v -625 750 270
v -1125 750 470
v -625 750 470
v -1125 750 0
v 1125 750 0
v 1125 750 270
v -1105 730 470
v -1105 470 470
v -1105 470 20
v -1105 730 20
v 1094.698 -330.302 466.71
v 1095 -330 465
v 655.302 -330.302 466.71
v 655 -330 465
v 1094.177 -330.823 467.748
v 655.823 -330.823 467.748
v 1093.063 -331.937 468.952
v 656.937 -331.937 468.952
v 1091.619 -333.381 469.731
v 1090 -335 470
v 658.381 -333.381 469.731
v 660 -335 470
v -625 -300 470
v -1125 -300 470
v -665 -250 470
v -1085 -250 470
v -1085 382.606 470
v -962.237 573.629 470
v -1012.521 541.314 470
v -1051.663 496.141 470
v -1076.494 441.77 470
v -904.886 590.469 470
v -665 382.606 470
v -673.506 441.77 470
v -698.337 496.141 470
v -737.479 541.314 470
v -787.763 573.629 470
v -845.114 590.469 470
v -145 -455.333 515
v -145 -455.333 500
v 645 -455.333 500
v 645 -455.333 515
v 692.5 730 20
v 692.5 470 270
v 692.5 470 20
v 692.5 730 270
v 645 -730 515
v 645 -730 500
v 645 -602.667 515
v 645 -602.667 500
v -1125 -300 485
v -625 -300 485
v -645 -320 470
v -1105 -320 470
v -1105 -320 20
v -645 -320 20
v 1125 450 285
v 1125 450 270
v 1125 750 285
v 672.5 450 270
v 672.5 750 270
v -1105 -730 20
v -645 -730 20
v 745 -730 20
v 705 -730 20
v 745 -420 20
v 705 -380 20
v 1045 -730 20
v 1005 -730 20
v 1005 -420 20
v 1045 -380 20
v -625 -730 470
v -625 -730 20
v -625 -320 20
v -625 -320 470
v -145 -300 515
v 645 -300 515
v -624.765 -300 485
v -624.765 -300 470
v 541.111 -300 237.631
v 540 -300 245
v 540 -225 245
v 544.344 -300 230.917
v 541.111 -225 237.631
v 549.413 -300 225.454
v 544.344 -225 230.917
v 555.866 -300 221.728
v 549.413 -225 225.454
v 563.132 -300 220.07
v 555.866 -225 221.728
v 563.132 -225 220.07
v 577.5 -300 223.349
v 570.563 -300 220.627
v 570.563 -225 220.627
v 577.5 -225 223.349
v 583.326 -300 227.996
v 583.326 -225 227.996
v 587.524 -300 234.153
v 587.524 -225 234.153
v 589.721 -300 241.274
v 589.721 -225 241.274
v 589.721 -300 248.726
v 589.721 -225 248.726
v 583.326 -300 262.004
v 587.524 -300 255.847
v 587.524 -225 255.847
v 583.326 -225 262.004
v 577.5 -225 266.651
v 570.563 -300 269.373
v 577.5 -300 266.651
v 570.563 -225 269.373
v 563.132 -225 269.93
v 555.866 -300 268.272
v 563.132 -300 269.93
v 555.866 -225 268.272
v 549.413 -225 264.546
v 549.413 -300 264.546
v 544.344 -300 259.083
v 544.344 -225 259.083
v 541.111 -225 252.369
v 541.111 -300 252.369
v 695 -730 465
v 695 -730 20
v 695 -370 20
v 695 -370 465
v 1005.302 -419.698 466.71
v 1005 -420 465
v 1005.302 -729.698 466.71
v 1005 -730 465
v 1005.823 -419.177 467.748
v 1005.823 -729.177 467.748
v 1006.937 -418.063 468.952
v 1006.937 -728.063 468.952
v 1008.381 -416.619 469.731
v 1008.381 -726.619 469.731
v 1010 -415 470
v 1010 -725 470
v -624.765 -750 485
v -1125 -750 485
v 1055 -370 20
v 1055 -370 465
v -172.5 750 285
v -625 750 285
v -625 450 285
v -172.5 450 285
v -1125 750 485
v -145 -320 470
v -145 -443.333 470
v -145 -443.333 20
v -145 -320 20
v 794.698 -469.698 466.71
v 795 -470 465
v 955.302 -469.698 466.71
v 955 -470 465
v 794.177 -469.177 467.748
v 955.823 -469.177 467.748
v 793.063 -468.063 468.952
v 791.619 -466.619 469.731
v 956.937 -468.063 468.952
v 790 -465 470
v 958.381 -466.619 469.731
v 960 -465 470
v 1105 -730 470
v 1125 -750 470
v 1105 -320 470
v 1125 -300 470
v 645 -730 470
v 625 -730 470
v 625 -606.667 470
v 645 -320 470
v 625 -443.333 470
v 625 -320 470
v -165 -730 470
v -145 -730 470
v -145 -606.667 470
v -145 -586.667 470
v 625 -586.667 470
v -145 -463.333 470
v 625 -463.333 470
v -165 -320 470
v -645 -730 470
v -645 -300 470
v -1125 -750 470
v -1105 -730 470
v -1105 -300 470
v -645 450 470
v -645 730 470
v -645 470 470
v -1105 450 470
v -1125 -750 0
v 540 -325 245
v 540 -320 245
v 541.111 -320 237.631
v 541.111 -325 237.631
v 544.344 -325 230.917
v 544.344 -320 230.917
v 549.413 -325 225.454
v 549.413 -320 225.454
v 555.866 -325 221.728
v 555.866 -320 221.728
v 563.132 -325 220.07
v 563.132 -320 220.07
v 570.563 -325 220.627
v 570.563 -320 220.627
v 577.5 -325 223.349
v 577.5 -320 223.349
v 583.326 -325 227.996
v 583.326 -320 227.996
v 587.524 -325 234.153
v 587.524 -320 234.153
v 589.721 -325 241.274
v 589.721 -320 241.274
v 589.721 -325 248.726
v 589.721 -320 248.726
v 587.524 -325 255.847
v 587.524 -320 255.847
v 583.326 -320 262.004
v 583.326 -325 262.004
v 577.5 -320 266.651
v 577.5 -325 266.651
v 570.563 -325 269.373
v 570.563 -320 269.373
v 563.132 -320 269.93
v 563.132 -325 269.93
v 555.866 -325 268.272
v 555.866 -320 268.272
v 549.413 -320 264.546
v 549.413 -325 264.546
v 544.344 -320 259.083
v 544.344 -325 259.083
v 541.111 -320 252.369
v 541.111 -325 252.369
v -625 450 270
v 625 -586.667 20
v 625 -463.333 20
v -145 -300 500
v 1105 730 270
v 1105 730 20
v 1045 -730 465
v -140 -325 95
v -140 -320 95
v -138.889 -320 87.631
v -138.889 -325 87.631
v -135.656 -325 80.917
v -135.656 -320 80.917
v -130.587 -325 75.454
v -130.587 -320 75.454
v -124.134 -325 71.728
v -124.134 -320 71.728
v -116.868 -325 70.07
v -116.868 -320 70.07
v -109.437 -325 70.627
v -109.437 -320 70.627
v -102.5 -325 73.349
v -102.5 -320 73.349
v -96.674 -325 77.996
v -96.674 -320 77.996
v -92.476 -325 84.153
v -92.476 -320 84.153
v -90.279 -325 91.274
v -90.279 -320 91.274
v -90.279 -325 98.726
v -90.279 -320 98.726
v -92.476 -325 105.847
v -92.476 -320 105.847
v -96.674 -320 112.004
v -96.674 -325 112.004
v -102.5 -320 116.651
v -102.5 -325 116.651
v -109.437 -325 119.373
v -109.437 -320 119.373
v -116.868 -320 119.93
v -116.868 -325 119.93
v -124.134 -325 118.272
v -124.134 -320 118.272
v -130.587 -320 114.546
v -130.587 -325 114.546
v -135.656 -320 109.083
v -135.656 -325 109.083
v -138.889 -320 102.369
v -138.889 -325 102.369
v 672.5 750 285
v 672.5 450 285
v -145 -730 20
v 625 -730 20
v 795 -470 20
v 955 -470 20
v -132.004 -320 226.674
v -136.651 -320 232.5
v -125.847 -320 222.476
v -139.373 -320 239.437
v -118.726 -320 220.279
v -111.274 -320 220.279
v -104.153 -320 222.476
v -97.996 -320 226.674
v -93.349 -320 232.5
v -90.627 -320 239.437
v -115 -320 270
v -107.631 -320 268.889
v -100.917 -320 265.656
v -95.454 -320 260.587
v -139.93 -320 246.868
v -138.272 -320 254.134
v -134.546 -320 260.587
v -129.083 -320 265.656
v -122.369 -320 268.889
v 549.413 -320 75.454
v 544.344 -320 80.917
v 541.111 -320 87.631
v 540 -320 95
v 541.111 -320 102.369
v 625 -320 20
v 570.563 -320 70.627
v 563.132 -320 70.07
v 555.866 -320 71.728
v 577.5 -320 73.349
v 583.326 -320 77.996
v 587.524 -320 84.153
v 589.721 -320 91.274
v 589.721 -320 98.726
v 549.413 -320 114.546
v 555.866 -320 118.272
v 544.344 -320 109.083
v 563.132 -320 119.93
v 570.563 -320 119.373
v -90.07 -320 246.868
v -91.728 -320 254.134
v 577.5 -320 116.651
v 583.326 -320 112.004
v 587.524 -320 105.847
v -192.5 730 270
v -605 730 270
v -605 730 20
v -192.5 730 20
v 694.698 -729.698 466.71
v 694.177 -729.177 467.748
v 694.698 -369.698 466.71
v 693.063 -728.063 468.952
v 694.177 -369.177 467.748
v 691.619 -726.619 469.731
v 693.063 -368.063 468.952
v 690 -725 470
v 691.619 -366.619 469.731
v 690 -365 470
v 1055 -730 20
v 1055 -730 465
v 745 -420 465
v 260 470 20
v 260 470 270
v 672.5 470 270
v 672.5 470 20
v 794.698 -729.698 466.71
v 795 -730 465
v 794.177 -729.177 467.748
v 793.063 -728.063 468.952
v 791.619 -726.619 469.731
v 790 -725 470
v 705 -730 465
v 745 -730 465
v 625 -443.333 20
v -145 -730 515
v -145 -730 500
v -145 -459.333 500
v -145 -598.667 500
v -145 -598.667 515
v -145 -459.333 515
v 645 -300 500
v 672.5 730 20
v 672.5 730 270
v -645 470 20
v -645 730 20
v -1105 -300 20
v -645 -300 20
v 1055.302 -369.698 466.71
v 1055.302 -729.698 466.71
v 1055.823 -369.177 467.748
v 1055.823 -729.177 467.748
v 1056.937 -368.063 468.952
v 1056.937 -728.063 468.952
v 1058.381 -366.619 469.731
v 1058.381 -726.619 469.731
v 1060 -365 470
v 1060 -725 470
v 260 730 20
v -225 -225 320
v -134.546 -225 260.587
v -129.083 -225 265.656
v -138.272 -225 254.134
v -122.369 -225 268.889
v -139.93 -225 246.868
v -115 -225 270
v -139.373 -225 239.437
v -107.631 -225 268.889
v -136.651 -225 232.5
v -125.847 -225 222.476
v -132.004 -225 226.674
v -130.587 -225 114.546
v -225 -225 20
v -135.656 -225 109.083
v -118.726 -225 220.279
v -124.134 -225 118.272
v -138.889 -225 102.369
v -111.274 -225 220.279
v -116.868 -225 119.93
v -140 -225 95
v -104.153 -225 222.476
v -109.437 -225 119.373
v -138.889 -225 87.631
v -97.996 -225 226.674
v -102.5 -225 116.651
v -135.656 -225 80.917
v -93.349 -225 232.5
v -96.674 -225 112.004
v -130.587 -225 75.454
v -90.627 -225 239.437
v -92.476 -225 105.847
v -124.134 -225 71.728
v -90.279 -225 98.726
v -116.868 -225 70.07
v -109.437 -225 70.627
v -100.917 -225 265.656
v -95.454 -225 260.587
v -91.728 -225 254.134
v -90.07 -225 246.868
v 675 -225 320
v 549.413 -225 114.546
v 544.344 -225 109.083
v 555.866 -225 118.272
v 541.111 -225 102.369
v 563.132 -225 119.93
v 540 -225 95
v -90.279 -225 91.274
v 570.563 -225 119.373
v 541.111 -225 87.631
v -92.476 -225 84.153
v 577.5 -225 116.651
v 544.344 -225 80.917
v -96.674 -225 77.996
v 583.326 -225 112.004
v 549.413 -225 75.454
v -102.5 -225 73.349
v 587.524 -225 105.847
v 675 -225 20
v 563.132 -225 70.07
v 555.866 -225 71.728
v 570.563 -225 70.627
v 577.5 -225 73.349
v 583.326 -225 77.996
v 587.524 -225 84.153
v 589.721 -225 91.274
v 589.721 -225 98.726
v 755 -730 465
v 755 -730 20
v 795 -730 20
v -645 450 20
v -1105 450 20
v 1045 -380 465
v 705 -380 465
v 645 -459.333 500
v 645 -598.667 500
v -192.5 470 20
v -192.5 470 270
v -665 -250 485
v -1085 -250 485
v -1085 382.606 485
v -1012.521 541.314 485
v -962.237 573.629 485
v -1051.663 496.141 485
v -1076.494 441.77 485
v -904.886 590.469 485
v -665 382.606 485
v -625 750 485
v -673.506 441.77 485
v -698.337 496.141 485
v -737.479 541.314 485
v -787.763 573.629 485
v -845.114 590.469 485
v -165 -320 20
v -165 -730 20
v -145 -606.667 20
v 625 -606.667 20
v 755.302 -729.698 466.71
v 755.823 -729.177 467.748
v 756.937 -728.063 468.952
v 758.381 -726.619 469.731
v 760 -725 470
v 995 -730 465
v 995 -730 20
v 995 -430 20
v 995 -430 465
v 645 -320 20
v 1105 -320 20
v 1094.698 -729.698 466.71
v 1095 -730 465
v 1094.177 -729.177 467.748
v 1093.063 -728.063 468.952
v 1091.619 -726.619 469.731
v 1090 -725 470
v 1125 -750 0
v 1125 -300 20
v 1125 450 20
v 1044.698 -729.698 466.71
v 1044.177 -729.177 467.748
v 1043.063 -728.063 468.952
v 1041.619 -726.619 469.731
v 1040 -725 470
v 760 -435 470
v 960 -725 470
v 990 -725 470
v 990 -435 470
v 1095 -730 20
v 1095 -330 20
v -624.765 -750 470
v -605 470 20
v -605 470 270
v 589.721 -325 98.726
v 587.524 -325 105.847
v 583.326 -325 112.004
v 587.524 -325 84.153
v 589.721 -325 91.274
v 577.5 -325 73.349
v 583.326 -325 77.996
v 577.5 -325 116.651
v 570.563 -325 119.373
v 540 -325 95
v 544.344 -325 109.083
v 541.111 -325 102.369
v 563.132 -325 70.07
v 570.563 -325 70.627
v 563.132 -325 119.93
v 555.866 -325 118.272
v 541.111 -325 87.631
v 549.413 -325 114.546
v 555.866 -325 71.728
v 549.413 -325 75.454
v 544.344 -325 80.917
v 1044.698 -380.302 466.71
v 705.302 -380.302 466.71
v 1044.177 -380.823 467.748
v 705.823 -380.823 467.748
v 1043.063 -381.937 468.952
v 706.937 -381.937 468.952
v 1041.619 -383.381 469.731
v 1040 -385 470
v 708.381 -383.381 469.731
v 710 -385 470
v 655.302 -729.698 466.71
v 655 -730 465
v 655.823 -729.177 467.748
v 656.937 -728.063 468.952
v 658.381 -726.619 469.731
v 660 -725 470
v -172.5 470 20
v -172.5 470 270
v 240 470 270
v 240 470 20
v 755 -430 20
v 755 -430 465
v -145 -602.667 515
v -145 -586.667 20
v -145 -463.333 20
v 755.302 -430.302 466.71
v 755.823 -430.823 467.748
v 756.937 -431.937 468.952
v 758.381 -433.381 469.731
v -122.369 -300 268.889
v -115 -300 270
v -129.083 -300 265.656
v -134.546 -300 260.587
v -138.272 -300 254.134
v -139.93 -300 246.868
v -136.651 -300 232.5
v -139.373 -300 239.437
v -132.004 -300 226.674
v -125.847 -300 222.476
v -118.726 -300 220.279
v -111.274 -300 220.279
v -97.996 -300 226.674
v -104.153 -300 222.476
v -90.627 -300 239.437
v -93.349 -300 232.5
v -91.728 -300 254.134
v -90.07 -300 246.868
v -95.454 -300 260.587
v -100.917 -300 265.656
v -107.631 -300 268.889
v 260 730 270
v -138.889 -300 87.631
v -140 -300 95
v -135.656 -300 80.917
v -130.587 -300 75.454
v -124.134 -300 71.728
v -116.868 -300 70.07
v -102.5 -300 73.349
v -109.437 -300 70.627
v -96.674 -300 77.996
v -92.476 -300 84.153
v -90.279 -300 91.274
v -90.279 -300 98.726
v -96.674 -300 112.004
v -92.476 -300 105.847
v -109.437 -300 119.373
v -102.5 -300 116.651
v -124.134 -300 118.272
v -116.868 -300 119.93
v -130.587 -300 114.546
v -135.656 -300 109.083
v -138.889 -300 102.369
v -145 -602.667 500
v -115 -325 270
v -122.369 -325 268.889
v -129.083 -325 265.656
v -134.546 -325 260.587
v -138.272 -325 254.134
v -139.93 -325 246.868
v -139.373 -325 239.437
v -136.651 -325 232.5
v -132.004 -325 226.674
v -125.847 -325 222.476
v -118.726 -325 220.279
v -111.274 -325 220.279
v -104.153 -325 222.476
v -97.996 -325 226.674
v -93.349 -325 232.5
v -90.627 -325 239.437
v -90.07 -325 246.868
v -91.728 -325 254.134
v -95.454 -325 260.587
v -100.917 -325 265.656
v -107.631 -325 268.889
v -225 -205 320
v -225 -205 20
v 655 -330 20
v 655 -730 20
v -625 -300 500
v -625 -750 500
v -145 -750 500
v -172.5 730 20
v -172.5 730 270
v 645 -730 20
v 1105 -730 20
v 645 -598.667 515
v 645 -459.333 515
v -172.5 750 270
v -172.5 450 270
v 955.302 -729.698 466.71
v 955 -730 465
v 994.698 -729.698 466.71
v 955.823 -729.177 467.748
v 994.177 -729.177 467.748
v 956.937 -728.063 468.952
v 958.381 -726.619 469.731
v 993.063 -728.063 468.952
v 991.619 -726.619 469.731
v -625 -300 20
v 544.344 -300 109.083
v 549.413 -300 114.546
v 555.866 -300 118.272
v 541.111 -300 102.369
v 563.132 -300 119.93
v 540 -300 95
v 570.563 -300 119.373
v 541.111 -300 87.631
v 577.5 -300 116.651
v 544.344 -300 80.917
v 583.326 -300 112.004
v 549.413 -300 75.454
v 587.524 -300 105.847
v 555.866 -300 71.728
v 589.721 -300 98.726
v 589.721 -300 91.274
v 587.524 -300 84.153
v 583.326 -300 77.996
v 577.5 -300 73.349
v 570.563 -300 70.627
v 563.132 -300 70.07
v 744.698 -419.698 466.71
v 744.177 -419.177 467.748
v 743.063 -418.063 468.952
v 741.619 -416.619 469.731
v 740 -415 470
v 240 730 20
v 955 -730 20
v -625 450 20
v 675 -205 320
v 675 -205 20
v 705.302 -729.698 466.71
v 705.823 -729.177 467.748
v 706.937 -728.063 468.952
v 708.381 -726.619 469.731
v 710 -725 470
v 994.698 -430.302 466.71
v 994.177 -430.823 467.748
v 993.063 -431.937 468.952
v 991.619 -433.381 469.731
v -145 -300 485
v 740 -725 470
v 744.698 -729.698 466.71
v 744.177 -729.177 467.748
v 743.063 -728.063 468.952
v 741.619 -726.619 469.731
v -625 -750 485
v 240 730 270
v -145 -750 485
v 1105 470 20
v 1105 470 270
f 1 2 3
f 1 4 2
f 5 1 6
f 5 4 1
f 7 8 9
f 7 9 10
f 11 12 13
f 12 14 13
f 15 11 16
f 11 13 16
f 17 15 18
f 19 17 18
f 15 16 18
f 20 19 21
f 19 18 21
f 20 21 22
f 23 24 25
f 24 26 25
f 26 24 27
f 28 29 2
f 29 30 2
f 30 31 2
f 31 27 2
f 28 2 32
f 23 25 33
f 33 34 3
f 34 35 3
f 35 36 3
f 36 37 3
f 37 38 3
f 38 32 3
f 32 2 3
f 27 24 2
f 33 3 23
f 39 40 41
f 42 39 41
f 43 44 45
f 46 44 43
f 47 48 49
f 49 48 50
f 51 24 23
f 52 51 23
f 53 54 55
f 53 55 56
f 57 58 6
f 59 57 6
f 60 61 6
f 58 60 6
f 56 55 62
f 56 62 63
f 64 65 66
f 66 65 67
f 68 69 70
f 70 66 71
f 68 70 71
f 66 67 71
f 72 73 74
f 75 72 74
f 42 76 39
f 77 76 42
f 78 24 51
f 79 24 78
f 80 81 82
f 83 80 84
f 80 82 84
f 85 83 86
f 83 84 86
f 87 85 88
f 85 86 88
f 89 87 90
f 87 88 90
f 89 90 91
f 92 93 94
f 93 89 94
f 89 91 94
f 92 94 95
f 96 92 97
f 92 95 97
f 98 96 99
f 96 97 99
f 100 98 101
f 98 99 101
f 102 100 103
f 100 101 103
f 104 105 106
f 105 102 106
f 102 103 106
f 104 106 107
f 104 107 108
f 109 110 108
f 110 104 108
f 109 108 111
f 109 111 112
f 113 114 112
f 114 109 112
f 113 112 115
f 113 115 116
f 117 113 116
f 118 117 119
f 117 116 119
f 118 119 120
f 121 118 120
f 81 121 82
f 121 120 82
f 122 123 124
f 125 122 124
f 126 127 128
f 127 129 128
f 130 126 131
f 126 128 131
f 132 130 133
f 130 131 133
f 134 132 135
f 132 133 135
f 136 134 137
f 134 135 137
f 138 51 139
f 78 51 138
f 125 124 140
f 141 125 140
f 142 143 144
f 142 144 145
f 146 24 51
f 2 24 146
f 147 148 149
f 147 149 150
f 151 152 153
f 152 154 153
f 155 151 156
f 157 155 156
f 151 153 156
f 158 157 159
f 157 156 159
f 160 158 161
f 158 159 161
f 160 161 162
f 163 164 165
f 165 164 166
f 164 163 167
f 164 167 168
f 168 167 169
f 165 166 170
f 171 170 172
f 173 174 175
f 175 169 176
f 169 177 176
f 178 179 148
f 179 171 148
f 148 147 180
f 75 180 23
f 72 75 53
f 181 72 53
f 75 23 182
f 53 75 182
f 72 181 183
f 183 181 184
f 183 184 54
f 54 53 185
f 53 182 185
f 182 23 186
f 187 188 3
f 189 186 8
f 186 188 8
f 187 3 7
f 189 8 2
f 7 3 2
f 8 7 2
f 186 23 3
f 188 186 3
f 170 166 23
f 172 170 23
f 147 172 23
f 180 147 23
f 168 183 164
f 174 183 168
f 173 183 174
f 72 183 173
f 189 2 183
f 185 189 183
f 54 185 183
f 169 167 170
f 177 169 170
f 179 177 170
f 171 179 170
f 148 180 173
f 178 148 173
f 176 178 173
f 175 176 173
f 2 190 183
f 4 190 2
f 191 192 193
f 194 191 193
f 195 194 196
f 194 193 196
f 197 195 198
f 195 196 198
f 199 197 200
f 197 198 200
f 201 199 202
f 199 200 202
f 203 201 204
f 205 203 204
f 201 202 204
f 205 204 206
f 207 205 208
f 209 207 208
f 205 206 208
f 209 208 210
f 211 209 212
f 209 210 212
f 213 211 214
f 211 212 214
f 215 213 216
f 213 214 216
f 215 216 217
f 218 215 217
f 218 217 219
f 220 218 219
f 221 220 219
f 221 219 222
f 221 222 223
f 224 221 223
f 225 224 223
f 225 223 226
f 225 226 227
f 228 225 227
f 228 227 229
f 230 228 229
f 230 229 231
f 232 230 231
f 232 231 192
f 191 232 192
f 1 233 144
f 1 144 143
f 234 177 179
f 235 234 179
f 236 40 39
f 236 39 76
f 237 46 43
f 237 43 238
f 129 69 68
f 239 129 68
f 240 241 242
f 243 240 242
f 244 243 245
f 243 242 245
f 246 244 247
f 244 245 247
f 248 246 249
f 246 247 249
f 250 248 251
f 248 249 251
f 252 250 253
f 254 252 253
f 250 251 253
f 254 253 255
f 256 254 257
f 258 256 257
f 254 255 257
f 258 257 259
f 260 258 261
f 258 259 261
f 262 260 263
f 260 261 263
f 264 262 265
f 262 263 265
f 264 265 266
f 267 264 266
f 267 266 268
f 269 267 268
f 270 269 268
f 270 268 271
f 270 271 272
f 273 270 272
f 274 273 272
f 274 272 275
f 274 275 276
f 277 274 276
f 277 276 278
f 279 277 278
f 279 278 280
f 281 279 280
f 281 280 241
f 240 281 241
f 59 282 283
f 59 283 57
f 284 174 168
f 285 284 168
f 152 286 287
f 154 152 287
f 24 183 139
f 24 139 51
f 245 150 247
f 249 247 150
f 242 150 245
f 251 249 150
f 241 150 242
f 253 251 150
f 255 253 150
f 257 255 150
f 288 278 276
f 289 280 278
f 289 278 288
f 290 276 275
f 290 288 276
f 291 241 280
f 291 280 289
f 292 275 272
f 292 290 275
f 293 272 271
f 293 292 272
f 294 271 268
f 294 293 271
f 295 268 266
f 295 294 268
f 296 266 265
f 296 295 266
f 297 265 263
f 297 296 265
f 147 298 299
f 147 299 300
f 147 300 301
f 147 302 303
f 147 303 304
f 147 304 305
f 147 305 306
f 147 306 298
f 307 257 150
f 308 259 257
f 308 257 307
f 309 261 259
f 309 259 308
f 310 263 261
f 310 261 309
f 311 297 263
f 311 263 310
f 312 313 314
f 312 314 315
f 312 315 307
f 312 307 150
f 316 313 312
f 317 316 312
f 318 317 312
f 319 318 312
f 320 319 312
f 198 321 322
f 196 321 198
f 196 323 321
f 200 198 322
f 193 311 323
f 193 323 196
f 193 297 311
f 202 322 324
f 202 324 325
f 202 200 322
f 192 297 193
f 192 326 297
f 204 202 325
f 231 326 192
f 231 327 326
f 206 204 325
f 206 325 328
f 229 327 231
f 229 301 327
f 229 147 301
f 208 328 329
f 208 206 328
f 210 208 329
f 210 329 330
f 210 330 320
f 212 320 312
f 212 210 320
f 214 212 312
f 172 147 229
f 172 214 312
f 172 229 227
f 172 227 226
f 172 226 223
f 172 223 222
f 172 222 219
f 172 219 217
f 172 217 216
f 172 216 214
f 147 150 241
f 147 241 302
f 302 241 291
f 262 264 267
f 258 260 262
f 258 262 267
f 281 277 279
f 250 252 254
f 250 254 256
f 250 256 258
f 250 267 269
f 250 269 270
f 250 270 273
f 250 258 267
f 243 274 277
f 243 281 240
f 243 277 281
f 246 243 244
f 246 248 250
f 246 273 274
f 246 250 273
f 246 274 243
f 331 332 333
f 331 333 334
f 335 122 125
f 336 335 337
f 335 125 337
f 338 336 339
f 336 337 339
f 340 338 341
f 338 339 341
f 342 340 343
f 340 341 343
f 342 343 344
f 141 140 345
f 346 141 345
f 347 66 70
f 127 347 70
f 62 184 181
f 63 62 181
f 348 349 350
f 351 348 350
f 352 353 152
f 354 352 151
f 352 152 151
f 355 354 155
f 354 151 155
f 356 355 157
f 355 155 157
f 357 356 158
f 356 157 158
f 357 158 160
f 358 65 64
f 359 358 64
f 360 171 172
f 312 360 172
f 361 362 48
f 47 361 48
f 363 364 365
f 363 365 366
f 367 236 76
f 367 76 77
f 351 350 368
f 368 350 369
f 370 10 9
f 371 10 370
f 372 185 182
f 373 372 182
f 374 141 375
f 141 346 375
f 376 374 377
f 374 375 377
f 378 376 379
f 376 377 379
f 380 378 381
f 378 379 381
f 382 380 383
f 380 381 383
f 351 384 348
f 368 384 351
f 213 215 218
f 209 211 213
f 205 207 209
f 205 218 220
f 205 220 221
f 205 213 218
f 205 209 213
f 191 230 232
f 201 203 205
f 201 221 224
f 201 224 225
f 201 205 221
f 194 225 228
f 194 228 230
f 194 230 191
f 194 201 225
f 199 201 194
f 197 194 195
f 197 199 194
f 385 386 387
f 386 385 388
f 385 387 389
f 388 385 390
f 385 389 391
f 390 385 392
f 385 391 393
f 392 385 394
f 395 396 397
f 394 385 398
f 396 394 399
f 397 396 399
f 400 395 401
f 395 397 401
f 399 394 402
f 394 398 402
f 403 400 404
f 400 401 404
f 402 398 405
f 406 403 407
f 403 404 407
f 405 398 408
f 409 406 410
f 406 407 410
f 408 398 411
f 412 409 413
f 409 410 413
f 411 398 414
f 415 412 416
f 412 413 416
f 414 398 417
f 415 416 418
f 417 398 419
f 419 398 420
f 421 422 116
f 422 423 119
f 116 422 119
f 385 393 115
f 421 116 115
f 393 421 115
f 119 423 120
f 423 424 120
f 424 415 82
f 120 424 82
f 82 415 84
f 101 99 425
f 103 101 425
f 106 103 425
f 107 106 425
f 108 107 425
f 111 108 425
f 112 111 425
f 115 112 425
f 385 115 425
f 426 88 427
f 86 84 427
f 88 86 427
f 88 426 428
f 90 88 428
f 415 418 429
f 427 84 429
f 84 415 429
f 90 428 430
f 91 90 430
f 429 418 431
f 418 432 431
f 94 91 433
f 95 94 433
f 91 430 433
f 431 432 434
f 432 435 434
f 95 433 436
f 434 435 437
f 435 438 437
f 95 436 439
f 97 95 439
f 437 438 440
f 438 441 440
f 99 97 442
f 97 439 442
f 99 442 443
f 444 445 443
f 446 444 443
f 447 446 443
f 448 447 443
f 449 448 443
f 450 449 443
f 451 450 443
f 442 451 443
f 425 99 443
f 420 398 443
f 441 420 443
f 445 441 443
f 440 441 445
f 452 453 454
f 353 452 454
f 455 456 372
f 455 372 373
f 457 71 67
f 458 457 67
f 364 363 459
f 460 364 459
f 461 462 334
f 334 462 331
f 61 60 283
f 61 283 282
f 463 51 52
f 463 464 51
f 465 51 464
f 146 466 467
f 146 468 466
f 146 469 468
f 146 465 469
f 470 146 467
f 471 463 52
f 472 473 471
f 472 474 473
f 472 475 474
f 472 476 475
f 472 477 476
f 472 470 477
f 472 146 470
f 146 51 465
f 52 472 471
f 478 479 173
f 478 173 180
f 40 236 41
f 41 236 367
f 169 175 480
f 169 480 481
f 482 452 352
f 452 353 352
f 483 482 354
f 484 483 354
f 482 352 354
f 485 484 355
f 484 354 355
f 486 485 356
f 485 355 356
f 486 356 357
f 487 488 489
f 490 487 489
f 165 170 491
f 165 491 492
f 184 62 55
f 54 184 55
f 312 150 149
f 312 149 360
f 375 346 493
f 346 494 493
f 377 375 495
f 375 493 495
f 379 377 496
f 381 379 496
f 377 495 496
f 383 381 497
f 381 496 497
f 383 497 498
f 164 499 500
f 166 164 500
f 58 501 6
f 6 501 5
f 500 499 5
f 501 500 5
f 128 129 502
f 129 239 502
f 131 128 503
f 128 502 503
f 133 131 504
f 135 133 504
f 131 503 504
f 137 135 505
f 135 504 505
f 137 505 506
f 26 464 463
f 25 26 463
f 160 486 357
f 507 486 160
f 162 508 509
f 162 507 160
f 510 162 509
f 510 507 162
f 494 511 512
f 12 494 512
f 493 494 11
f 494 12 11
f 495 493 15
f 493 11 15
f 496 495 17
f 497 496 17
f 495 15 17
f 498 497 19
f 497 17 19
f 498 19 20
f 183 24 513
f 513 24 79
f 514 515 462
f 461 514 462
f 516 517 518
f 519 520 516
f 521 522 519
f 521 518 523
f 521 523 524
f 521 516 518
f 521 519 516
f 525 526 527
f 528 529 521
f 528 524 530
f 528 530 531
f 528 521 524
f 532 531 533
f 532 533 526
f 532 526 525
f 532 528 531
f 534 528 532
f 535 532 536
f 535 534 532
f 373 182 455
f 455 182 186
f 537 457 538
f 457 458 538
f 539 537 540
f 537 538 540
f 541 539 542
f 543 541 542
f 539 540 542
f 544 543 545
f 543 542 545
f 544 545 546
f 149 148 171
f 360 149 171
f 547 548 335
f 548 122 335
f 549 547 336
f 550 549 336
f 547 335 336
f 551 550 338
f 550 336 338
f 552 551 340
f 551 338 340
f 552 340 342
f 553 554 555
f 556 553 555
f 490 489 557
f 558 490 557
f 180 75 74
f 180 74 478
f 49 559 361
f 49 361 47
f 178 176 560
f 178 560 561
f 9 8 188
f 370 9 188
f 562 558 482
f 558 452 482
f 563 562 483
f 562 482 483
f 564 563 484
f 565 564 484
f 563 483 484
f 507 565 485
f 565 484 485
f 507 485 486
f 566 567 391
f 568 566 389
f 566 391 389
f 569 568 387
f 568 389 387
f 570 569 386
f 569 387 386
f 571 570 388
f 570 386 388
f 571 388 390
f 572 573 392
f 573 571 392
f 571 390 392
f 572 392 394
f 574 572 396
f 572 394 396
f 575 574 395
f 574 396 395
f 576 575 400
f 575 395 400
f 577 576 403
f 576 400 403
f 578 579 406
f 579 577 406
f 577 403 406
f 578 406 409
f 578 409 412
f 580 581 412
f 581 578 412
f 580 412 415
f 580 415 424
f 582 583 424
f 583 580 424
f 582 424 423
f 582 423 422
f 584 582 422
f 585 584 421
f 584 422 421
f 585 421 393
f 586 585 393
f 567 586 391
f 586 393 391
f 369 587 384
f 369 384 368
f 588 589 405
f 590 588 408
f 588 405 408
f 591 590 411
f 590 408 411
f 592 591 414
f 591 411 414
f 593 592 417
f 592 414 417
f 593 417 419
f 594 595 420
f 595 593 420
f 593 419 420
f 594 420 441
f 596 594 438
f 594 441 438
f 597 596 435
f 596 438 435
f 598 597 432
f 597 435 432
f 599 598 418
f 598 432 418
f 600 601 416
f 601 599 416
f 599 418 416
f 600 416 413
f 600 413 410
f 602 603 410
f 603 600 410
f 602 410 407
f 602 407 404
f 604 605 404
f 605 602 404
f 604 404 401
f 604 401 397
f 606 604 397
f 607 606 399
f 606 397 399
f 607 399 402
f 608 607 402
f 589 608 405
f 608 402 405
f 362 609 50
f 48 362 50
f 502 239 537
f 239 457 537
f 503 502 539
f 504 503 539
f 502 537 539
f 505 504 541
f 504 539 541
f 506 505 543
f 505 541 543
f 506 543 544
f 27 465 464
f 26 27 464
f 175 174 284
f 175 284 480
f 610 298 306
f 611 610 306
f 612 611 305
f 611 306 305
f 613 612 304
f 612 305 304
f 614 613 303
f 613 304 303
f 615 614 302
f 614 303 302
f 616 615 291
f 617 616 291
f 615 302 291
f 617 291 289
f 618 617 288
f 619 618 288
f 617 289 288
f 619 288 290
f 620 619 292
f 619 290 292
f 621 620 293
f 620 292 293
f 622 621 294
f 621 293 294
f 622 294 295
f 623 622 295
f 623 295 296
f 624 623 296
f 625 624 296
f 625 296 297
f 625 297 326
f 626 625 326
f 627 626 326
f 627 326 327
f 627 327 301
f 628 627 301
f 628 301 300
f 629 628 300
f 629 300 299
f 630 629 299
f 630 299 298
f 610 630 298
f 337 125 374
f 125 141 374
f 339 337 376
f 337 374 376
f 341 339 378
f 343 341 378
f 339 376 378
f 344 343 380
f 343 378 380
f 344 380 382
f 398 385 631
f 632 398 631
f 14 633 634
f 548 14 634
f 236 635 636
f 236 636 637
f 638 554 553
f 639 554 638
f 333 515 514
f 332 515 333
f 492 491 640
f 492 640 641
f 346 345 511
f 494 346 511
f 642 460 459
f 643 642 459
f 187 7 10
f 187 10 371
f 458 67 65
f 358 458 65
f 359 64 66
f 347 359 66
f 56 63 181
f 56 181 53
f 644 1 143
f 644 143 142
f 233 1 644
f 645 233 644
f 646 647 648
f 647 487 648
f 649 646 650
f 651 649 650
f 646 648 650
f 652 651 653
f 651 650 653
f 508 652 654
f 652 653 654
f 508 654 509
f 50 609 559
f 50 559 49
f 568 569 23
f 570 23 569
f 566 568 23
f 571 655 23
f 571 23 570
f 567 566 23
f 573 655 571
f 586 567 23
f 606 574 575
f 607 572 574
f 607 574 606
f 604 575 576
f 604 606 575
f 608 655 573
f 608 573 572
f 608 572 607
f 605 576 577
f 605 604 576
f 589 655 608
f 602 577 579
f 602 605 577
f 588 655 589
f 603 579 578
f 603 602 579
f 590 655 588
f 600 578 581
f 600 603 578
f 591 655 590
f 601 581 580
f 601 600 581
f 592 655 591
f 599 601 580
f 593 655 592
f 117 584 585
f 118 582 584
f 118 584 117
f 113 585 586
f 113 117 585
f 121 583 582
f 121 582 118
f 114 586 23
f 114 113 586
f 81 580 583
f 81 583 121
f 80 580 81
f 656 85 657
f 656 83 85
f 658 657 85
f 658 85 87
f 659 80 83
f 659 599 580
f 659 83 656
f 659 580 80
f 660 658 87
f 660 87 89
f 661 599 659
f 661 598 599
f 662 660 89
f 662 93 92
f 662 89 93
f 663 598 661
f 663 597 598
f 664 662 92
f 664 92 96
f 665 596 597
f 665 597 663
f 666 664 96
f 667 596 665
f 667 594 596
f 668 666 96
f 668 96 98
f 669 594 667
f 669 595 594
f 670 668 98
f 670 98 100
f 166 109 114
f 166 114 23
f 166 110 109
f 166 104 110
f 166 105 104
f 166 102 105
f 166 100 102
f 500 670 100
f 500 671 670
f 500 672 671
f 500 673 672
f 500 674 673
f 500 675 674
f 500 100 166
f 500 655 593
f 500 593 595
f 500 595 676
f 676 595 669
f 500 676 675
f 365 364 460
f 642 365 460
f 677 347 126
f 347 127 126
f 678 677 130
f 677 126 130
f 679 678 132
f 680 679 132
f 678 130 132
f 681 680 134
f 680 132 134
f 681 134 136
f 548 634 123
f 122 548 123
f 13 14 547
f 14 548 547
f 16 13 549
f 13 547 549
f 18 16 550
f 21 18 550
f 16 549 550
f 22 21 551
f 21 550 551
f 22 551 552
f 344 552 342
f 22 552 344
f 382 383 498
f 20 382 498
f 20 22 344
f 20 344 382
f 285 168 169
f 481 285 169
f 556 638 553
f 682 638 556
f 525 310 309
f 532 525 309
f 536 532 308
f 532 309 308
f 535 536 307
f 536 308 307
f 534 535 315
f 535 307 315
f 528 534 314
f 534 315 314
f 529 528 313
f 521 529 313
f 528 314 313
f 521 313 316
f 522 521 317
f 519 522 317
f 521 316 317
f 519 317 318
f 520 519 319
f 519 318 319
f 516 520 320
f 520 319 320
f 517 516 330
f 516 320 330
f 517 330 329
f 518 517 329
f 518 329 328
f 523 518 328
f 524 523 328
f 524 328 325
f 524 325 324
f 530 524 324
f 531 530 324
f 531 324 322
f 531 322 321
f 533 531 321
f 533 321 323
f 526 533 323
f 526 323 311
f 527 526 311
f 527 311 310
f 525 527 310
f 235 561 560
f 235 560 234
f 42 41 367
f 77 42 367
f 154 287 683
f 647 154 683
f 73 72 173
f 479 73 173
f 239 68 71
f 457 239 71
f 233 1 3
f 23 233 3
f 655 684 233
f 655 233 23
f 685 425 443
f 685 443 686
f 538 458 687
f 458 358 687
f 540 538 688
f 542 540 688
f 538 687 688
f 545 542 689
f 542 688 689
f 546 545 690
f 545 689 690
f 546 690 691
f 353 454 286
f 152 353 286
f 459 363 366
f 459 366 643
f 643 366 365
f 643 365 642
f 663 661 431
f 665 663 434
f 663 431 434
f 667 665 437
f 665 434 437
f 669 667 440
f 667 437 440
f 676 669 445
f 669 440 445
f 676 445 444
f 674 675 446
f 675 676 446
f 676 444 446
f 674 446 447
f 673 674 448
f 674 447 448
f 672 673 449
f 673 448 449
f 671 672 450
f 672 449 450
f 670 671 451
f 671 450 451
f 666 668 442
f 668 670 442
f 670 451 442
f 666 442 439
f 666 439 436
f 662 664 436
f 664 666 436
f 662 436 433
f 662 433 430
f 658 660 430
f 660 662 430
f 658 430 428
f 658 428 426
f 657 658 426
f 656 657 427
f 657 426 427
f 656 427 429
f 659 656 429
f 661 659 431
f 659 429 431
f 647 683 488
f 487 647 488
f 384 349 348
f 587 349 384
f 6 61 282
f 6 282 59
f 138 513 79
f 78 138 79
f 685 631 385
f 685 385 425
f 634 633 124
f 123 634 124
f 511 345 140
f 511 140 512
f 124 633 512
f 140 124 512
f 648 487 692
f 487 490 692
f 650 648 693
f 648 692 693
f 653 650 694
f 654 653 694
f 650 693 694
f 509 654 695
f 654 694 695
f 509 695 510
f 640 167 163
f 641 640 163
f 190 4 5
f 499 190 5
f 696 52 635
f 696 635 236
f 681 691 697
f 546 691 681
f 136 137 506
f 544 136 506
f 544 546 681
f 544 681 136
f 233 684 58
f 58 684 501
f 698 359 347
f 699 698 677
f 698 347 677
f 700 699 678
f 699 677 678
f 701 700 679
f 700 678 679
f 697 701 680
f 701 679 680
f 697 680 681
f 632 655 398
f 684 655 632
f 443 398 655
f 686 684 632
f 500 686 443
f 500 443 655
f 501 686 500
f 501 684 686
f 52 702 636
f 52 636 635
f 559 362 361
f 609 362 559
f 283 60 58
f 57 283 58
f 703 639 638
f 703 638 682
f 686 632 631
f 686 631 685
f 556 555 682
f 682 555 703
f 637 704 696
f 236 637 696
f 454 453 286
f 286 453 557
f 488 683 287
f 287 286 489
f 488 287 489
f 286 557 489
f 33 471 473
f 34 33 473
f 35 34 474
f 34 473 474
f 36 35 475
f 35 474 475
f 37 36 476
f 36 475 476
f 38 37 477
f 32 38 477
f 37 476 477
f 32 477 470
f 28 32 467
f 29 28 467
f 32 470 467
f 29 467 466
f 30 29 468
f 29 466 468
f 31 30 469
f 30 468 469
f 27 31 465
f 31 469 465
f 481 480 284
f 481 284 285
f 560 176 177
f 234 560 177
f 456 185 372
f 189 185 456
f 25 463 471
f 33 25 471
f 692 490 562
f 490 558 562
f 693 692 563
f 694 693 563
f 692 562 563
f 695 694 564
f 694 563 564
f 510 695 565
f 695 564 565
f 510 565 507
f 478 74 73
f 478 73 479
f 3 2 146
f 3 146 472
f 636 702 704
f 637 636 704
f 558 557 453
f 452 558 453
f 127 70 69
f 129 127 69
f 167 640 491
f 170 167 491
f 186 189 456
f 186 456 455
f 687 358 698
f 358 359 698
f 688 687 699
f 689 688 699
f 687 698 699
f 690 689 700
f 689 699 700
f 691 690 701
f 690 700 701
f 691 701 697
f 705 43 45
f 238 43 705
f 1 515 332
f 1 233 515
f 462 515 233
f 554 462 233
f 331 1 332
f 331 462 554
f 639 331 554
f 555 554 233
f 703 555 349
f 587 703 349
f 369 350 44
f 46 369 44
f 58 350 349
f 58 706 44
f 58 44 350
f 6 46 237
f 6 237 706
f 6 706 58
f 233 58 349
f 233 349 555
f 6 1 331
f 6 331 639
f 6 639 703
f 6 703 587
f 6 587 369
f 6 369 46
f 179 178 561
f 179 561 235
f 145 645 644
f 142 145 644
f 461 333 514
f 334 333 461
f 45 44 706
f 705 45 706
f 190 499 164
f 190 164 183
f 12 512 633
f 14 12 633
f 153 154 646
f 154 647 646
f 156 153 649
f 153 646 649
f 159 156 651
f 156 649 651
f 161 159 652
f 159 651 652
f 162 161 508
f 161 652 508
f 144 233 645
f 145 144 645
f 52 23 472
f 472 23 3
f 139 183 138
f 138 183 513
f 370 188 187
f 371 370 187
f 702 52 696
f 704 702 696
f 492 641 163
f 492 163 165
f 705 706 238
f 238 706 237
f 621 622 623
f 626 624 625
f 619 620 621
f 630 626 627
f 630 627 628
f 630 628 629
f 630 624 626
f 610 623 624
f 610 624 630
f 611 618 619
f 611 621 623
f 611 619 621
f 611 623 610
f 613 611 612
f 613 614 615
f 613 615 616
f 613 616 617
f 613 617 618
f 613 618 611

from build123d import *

# Parameters (mm, degrees)
SKETCH1_W              = 2250
SKETCH1_H              = 1500
BOSS_EXTRUDE1_DEPTH    = 20
BOSS_EXTRUDE2_DEPTH    = 450
SKETCH4_W              = 1750
SKETCH4_H              = 300
BOSS_EXTRUDE3_DEPTH    = 250
SKETCH5_W              = 412.5
SKETCH5_H              = 260
CUT_EXTRUDE1_DEPTH     = 250
SKETCH6_W              = 460
SKETCH6_H              = 260
SKETCH6_H_2            = 750
SKETCH6_H_3            = 410
SKETCH6_W_2            = 770
SKETCH6_H_4            = 123.333333333
SKETCH6_H_5            = 123.333333334
CUT_EXTRUDE2_DEPTH     = 450
SKETCH7_W              = 900
SKETCH7_H              = 20
BOSS_EXTRUDE6_DEPTH    = 300
SKETCH10_R             = 25
BOSS_EXTRUDE7_DEPTH    = 100
BOSS_EXTRUDE8_DEPTH    = 450
BOSS_EXTRUDE8_2_DEPTH  = 450
BOSS_EXTRUDE8_3_DEPTH  = 450
FILLET1_R              = 5
FILLET2_R              = 5
FILLET3_R              = 5
SKETCH13_W             = 452.5
SKETCH13_H             = 300
BOSS_EXTRUDE9_DEPTH    = 15
BOSS_EXTRUDE9_2_DEPTH  = 15
SKETCH14_W             = 500
SKETCH14_H             = 1050
BOSS_EXTRUDE10_DEPTH   = 15
SKETCH15_W             = 500.235374178
SKETCH15_H             = 450
BOSS_EXTRUDE11_DEPTH   = 15
SKETCH16_W             = 480
SKETCH16_H             = 450
BOSS_EXTRUDE12_DEPTH   = 15
SKETCH17_W             = 790
SKETCH17_H             = 155.333333333
BOSS_EXTRUDE13_DEPTH   = 15
SKETCH17_H_2           = 139.333333334
BOSS_EXTRUDE13_2_DEPTH = 15
SKETCH17_H_3           = 127.333333333
BOSS_EXTRUDE13_3_DEPTH = 15
CUT_EXTRUDE3_DEPTH     = 15


with BuildPart() as part:
    # Sketch1 → Boss-Extrude1 (new body)
    with BuildSketch(Plane.XY):
        Rectangle(SKETCH1_W, SKETCH1_H)
    extrude(amount=BOSS_EXTRUDE1_DEPTH)

    # Sketch2 → Boss-Extrude2 (add)
    with BuildSketch(Plane.XY.offset(20)):
        Polygon((-625, 750), (-625, -300), (1125, -300), (1125, -750), (-1125, -750), (-1125, 750), align=None)
    extrude(amount=BOSS_EXTRUDE2_DEPTH)

    # Sketch4 → Boss-Extrude3 (add)
    with BuildSketch(Plane.XY.offset(20)):
        with Locations((250, 600)):
            Rectangle(SKETCH4_W, SKETCH4_H)
    extrude(amount=BOSS_EXTRUDE3_DEPTH)

    # Sketch5 → Cut-Extrude1 (cut)
    with BuildSketch(Plane.XY.offset(270)):
        with Locations((-398.75, 600)):
            Rectangle(SKETCH5_W, SKETCH5_H)
        with Locations((33.75, 600)):
            Rectangle(SKETCH5_W, SKETCH5_H)
        with Locations((466.25, 600)):
            Rectangle(SKETCH5_W, SKETCH5_H)
        with Locations((898.75, 600)):
            Rectangle(SKETCH5_W, SKETCH5_H)
    extrude(amount=-CUT_EXTRUDE1_DEPTH, mode=Mode.SUBTRACT)

    # Sketch6 → Cut-Extrude2 (cut)
    with BuildSketch(Plane.XY.offset(470)):
        with Locations((-875, 600)):
            Rectangle(SKETCH6_W, SKETCH6_H)
        with Locations((-875, 75)):
            Rectangle(SKETCH6_W, SKETCH6_H_2)
        with Locations((-875, -525)):
            Rectangle(SKETCH6_W, SKETCH6_H_3)
        with Locations((-395, -525)):
            Rectangle(SKETCH6_W, SKETCH6_H_3)
        with Locations((875, -525)):
            Rectangle(SKETCH6_W, SKETCH6_H_3)
        with Locations((240, -381.666666667)):
            Rectangle(SKETCH6_W_2, SKETCH6_H_4)
        with Locations((240, -525)):
            Rectangle(SKETCH6_W_2, SKETCH6_H_5)
        with Locations((240, -668.333333334)):
            Rectangle(SKETCH6_W_2, SKETCH6_H_4)
    extrude(amount=-CUT_EXTRUDE2_DEPTH, mode=Mode.SUBTRACT)



with BuildPart() as body_2:
    # Sketch7 → Boss-Extrude6 (new body)
    with BuildSketch(Plane.XY.offset(20)):
        with Locations((225, -215)):
            Rectangle(SKETCH7_W, SKETCH7_H)
    extrude(amount=BOSS_EXTRUDE6_DEPTH)


with BuildPart() as part_1:
    add(part.part)

    add(body_2.part)  # Boss-Extrude7 merges body 2
    # Sketch10 → Boss-Extrude7 (add)
    with BuildSketch(Plane.XZ.offset(225)):
        with Locations(Location((-115, 245, 0), (0, 0, 90))):
            Circle(SKETCH10_R)
        with Locations(Location((-115, 95, 0), (0, 0, 180))):
            Circle(SKETCH10_R)
        with Locations(Location((565, 245, 0), (0, 0, 180))):
            Circle(SKETCH10_R)
        with Locations(Location((565, 95, 0), (0, 0, 180))):
            Circle(SKETCH10_R)
    extrude(amount=BOSS_EXTRUDE7_DEPTH)


with BuildPart() as body_2_2:
    # Sketch11 → Boss-Extrude8 (new body)
    with BuildSketch(Plane.XY.offset(20)):
        Polygon((1095, -330), (655, -330), (655, -730), (695, -730), (695, -370), (1055, -370), (1055, -730), (1095, -730), align=None)
    extrude(amount=BOSS_EXTRUDE8_DEPTH)

    # Fillet1
    fillet1_edges = [body_2_2.edges().sort_by_distance(p)[0] for p in [
        (655, -530, 470),
        (675, -730, 470),
        (695, -550, 470),
        (875, -330, 470),
        (1095, -530, 470),
        (875, -370, 470),
        (1055, -550, 470),
        (1075, -730, 470),
    ]]
    fillet(fillet1_edges, radius=FILLET1_R)


with BuildPart() as body_3:
    # Sketch11 → Boss-Extrude8 2 (new body)
    with BuildSketch(Plane.XY.offset(20)):
        Polygon((705, -380), (705, -730), (745, -730), (745, -420), (1005, -420), (1005, -730), (1045, -730), (1045, -380), align=None)
    extrude(amount=BOSS_EXTRUDE8_2_DEPTH)

    # Fillet2
    fillet2_edges = [body_3.edges().sort_by_distance(p)[0] for p in [
        (705, -555, 470),
        (725, -730, 470),
        (745, -575, 470),
        (875, -380, 470),
        (1045, -555, 470),
        (875, -420, 470),
        (1005, -575, 470),
        (1025, -730, 470),
    ]]
    fillet(fillet2_edges, radius=FILLET2_R)


with BuildPart() as body_4:
    # Sketch11 → Boss-Extrude8 3 (new body)
    with BuildSketch(Plane.XY.offset(20)):
        Polygon((755, -430), (755, -730), (795, -730), (795, -470), (955, -470), (955, -730), (995, -730), (995, -430), align=None)
    extrude(amount=BOSS_EXTRUDE8_3_DEPTH)

    # Fillet3
    fillet3_edges = [body_4.edges().sort_by_distance(p)[0] for p in [
        (755, -580, 470),
        (775, -730, 470),
        (795, -600, 470),
        (875, -430, 470),
        (995, -580, 470),
        (875, -470, 470),
        (955, -600, 470),
        (975, -730, 470),
    ]]
    fillet(fillet3_edges, radius=FILLET3_R)


with BuildPart() as body_5:
    # Sketch13 → Boss-Extrude9 (new body)
    with BuildSketch(Plane.XY.offset(270)):
        with Locations((-398.75, 600)):
            Rectangle(SKETCH13_W, SKETCH13_H)
    extrude(amount=BOSS_EXTRUDE9_DEPTH)


with BuildPart() as body_6:
    # Sketch13 → Boss-Extrude9 2 (new body)
    with BuildSketch(Plane.XY.offset(270)):
        with Locations((898.75, 600)):
            Rectangle(SKETCH13_W, SKETCH13_H)
    extrude(amount=BOSS_EXTRUDE9_2_DEPTH)


with BuildPart() as body_7:
    # Sketch14 → Boss-Extrude10 (new body)
    with BuildSketch(Plane.XY.offset(470)):
        with Locations((-875, 225)):
            Rectangle(SKETCH14_W, SKETCH14_H)
    extrude(amount=BOSS_EXTRUDE10_DEPTH)

    # Sketch18 → Cut-Extrude3 (cut)
    with BuildSketch(Plane.XY.offset(485)):
        with BuildLine():
            Line((-1085, 382.606281643), (-1085, -250))
            Line((-1085, -250), (-665, -250))
            Line((-665, -250), (-665, 382.606281643))
            ThreePointArc((-665, 382.606281643), (-875, 592.606281643), (-1085, 382.606281643))
        make_face()
    extrude(amount=-CUT_EXTRUDE3_DEPTH, mode=Mode.SUBTRACT)


with BuildPart() as body_8:
    # Sketch15 → Boss-Extrude11 (new body)
    with BuildSketch(Plane.XY.offset(470)):
        with Locations((-874.882312911, -525)):
            Rectangle(SKETCH15_W, SKETCH15_H)
    extrude(amount=BOSS_EXTRUDE11_DEPTH)


with BuildPart() as body_9:
    # Sketch16 → Boss-Extrude12 (new body)
    with BuildSketch(Plane.XY.offset(485)):
        with Locations((-385, -525)):
            Rectangle(SKETCH16_W, SKETCH16_H)
    extrude(amount=BOSS_EXTRUDE12_DEPTH)


with BuildPart() as body_10:
    # Sketch17 → Boss-Extrude13 (new body)
    with BuildSketch(Plane.XY.offset(500)):
        with Locations((250, -377.666666667)):
            Rectangle(SKETCH17_W, SKETCH17_H)
    extrude(amount=BOSS_EXTRUDE13_DEPTH)


with BuildPart() as body_11:
    # Sketch17 → Boss-Extrude13 2 (new body)
    with BuildSketch(Plane.XY.offset(500)):
        with Locations((250, -529)):
            Rectangle(SKETCH17_W, SKETCH17_H_2)
    extrude(amount=BOSS_EXTRUDE13_2_DEPTH)


with BuildPart() as body_12:
    # Sketch17 → Boss-Extrude13 3 (new body)
    with BuildSketch(Plane.XY.offset(500)):
        with Locations((250, -666.333333334)):
            Rectangle(SKETCH17_W, SKETCH17_H_3)
    extrude(amount=BOSS_EXTRUDE13_3_DEPTH)


solid = Compound([part_1.part, body_2_2.part, body_3.part, body_4.part, body_5.part, body_6.part, body_7.part, body_8.part, body_9.part, body_10.part, body_11.part, body_12.part])
